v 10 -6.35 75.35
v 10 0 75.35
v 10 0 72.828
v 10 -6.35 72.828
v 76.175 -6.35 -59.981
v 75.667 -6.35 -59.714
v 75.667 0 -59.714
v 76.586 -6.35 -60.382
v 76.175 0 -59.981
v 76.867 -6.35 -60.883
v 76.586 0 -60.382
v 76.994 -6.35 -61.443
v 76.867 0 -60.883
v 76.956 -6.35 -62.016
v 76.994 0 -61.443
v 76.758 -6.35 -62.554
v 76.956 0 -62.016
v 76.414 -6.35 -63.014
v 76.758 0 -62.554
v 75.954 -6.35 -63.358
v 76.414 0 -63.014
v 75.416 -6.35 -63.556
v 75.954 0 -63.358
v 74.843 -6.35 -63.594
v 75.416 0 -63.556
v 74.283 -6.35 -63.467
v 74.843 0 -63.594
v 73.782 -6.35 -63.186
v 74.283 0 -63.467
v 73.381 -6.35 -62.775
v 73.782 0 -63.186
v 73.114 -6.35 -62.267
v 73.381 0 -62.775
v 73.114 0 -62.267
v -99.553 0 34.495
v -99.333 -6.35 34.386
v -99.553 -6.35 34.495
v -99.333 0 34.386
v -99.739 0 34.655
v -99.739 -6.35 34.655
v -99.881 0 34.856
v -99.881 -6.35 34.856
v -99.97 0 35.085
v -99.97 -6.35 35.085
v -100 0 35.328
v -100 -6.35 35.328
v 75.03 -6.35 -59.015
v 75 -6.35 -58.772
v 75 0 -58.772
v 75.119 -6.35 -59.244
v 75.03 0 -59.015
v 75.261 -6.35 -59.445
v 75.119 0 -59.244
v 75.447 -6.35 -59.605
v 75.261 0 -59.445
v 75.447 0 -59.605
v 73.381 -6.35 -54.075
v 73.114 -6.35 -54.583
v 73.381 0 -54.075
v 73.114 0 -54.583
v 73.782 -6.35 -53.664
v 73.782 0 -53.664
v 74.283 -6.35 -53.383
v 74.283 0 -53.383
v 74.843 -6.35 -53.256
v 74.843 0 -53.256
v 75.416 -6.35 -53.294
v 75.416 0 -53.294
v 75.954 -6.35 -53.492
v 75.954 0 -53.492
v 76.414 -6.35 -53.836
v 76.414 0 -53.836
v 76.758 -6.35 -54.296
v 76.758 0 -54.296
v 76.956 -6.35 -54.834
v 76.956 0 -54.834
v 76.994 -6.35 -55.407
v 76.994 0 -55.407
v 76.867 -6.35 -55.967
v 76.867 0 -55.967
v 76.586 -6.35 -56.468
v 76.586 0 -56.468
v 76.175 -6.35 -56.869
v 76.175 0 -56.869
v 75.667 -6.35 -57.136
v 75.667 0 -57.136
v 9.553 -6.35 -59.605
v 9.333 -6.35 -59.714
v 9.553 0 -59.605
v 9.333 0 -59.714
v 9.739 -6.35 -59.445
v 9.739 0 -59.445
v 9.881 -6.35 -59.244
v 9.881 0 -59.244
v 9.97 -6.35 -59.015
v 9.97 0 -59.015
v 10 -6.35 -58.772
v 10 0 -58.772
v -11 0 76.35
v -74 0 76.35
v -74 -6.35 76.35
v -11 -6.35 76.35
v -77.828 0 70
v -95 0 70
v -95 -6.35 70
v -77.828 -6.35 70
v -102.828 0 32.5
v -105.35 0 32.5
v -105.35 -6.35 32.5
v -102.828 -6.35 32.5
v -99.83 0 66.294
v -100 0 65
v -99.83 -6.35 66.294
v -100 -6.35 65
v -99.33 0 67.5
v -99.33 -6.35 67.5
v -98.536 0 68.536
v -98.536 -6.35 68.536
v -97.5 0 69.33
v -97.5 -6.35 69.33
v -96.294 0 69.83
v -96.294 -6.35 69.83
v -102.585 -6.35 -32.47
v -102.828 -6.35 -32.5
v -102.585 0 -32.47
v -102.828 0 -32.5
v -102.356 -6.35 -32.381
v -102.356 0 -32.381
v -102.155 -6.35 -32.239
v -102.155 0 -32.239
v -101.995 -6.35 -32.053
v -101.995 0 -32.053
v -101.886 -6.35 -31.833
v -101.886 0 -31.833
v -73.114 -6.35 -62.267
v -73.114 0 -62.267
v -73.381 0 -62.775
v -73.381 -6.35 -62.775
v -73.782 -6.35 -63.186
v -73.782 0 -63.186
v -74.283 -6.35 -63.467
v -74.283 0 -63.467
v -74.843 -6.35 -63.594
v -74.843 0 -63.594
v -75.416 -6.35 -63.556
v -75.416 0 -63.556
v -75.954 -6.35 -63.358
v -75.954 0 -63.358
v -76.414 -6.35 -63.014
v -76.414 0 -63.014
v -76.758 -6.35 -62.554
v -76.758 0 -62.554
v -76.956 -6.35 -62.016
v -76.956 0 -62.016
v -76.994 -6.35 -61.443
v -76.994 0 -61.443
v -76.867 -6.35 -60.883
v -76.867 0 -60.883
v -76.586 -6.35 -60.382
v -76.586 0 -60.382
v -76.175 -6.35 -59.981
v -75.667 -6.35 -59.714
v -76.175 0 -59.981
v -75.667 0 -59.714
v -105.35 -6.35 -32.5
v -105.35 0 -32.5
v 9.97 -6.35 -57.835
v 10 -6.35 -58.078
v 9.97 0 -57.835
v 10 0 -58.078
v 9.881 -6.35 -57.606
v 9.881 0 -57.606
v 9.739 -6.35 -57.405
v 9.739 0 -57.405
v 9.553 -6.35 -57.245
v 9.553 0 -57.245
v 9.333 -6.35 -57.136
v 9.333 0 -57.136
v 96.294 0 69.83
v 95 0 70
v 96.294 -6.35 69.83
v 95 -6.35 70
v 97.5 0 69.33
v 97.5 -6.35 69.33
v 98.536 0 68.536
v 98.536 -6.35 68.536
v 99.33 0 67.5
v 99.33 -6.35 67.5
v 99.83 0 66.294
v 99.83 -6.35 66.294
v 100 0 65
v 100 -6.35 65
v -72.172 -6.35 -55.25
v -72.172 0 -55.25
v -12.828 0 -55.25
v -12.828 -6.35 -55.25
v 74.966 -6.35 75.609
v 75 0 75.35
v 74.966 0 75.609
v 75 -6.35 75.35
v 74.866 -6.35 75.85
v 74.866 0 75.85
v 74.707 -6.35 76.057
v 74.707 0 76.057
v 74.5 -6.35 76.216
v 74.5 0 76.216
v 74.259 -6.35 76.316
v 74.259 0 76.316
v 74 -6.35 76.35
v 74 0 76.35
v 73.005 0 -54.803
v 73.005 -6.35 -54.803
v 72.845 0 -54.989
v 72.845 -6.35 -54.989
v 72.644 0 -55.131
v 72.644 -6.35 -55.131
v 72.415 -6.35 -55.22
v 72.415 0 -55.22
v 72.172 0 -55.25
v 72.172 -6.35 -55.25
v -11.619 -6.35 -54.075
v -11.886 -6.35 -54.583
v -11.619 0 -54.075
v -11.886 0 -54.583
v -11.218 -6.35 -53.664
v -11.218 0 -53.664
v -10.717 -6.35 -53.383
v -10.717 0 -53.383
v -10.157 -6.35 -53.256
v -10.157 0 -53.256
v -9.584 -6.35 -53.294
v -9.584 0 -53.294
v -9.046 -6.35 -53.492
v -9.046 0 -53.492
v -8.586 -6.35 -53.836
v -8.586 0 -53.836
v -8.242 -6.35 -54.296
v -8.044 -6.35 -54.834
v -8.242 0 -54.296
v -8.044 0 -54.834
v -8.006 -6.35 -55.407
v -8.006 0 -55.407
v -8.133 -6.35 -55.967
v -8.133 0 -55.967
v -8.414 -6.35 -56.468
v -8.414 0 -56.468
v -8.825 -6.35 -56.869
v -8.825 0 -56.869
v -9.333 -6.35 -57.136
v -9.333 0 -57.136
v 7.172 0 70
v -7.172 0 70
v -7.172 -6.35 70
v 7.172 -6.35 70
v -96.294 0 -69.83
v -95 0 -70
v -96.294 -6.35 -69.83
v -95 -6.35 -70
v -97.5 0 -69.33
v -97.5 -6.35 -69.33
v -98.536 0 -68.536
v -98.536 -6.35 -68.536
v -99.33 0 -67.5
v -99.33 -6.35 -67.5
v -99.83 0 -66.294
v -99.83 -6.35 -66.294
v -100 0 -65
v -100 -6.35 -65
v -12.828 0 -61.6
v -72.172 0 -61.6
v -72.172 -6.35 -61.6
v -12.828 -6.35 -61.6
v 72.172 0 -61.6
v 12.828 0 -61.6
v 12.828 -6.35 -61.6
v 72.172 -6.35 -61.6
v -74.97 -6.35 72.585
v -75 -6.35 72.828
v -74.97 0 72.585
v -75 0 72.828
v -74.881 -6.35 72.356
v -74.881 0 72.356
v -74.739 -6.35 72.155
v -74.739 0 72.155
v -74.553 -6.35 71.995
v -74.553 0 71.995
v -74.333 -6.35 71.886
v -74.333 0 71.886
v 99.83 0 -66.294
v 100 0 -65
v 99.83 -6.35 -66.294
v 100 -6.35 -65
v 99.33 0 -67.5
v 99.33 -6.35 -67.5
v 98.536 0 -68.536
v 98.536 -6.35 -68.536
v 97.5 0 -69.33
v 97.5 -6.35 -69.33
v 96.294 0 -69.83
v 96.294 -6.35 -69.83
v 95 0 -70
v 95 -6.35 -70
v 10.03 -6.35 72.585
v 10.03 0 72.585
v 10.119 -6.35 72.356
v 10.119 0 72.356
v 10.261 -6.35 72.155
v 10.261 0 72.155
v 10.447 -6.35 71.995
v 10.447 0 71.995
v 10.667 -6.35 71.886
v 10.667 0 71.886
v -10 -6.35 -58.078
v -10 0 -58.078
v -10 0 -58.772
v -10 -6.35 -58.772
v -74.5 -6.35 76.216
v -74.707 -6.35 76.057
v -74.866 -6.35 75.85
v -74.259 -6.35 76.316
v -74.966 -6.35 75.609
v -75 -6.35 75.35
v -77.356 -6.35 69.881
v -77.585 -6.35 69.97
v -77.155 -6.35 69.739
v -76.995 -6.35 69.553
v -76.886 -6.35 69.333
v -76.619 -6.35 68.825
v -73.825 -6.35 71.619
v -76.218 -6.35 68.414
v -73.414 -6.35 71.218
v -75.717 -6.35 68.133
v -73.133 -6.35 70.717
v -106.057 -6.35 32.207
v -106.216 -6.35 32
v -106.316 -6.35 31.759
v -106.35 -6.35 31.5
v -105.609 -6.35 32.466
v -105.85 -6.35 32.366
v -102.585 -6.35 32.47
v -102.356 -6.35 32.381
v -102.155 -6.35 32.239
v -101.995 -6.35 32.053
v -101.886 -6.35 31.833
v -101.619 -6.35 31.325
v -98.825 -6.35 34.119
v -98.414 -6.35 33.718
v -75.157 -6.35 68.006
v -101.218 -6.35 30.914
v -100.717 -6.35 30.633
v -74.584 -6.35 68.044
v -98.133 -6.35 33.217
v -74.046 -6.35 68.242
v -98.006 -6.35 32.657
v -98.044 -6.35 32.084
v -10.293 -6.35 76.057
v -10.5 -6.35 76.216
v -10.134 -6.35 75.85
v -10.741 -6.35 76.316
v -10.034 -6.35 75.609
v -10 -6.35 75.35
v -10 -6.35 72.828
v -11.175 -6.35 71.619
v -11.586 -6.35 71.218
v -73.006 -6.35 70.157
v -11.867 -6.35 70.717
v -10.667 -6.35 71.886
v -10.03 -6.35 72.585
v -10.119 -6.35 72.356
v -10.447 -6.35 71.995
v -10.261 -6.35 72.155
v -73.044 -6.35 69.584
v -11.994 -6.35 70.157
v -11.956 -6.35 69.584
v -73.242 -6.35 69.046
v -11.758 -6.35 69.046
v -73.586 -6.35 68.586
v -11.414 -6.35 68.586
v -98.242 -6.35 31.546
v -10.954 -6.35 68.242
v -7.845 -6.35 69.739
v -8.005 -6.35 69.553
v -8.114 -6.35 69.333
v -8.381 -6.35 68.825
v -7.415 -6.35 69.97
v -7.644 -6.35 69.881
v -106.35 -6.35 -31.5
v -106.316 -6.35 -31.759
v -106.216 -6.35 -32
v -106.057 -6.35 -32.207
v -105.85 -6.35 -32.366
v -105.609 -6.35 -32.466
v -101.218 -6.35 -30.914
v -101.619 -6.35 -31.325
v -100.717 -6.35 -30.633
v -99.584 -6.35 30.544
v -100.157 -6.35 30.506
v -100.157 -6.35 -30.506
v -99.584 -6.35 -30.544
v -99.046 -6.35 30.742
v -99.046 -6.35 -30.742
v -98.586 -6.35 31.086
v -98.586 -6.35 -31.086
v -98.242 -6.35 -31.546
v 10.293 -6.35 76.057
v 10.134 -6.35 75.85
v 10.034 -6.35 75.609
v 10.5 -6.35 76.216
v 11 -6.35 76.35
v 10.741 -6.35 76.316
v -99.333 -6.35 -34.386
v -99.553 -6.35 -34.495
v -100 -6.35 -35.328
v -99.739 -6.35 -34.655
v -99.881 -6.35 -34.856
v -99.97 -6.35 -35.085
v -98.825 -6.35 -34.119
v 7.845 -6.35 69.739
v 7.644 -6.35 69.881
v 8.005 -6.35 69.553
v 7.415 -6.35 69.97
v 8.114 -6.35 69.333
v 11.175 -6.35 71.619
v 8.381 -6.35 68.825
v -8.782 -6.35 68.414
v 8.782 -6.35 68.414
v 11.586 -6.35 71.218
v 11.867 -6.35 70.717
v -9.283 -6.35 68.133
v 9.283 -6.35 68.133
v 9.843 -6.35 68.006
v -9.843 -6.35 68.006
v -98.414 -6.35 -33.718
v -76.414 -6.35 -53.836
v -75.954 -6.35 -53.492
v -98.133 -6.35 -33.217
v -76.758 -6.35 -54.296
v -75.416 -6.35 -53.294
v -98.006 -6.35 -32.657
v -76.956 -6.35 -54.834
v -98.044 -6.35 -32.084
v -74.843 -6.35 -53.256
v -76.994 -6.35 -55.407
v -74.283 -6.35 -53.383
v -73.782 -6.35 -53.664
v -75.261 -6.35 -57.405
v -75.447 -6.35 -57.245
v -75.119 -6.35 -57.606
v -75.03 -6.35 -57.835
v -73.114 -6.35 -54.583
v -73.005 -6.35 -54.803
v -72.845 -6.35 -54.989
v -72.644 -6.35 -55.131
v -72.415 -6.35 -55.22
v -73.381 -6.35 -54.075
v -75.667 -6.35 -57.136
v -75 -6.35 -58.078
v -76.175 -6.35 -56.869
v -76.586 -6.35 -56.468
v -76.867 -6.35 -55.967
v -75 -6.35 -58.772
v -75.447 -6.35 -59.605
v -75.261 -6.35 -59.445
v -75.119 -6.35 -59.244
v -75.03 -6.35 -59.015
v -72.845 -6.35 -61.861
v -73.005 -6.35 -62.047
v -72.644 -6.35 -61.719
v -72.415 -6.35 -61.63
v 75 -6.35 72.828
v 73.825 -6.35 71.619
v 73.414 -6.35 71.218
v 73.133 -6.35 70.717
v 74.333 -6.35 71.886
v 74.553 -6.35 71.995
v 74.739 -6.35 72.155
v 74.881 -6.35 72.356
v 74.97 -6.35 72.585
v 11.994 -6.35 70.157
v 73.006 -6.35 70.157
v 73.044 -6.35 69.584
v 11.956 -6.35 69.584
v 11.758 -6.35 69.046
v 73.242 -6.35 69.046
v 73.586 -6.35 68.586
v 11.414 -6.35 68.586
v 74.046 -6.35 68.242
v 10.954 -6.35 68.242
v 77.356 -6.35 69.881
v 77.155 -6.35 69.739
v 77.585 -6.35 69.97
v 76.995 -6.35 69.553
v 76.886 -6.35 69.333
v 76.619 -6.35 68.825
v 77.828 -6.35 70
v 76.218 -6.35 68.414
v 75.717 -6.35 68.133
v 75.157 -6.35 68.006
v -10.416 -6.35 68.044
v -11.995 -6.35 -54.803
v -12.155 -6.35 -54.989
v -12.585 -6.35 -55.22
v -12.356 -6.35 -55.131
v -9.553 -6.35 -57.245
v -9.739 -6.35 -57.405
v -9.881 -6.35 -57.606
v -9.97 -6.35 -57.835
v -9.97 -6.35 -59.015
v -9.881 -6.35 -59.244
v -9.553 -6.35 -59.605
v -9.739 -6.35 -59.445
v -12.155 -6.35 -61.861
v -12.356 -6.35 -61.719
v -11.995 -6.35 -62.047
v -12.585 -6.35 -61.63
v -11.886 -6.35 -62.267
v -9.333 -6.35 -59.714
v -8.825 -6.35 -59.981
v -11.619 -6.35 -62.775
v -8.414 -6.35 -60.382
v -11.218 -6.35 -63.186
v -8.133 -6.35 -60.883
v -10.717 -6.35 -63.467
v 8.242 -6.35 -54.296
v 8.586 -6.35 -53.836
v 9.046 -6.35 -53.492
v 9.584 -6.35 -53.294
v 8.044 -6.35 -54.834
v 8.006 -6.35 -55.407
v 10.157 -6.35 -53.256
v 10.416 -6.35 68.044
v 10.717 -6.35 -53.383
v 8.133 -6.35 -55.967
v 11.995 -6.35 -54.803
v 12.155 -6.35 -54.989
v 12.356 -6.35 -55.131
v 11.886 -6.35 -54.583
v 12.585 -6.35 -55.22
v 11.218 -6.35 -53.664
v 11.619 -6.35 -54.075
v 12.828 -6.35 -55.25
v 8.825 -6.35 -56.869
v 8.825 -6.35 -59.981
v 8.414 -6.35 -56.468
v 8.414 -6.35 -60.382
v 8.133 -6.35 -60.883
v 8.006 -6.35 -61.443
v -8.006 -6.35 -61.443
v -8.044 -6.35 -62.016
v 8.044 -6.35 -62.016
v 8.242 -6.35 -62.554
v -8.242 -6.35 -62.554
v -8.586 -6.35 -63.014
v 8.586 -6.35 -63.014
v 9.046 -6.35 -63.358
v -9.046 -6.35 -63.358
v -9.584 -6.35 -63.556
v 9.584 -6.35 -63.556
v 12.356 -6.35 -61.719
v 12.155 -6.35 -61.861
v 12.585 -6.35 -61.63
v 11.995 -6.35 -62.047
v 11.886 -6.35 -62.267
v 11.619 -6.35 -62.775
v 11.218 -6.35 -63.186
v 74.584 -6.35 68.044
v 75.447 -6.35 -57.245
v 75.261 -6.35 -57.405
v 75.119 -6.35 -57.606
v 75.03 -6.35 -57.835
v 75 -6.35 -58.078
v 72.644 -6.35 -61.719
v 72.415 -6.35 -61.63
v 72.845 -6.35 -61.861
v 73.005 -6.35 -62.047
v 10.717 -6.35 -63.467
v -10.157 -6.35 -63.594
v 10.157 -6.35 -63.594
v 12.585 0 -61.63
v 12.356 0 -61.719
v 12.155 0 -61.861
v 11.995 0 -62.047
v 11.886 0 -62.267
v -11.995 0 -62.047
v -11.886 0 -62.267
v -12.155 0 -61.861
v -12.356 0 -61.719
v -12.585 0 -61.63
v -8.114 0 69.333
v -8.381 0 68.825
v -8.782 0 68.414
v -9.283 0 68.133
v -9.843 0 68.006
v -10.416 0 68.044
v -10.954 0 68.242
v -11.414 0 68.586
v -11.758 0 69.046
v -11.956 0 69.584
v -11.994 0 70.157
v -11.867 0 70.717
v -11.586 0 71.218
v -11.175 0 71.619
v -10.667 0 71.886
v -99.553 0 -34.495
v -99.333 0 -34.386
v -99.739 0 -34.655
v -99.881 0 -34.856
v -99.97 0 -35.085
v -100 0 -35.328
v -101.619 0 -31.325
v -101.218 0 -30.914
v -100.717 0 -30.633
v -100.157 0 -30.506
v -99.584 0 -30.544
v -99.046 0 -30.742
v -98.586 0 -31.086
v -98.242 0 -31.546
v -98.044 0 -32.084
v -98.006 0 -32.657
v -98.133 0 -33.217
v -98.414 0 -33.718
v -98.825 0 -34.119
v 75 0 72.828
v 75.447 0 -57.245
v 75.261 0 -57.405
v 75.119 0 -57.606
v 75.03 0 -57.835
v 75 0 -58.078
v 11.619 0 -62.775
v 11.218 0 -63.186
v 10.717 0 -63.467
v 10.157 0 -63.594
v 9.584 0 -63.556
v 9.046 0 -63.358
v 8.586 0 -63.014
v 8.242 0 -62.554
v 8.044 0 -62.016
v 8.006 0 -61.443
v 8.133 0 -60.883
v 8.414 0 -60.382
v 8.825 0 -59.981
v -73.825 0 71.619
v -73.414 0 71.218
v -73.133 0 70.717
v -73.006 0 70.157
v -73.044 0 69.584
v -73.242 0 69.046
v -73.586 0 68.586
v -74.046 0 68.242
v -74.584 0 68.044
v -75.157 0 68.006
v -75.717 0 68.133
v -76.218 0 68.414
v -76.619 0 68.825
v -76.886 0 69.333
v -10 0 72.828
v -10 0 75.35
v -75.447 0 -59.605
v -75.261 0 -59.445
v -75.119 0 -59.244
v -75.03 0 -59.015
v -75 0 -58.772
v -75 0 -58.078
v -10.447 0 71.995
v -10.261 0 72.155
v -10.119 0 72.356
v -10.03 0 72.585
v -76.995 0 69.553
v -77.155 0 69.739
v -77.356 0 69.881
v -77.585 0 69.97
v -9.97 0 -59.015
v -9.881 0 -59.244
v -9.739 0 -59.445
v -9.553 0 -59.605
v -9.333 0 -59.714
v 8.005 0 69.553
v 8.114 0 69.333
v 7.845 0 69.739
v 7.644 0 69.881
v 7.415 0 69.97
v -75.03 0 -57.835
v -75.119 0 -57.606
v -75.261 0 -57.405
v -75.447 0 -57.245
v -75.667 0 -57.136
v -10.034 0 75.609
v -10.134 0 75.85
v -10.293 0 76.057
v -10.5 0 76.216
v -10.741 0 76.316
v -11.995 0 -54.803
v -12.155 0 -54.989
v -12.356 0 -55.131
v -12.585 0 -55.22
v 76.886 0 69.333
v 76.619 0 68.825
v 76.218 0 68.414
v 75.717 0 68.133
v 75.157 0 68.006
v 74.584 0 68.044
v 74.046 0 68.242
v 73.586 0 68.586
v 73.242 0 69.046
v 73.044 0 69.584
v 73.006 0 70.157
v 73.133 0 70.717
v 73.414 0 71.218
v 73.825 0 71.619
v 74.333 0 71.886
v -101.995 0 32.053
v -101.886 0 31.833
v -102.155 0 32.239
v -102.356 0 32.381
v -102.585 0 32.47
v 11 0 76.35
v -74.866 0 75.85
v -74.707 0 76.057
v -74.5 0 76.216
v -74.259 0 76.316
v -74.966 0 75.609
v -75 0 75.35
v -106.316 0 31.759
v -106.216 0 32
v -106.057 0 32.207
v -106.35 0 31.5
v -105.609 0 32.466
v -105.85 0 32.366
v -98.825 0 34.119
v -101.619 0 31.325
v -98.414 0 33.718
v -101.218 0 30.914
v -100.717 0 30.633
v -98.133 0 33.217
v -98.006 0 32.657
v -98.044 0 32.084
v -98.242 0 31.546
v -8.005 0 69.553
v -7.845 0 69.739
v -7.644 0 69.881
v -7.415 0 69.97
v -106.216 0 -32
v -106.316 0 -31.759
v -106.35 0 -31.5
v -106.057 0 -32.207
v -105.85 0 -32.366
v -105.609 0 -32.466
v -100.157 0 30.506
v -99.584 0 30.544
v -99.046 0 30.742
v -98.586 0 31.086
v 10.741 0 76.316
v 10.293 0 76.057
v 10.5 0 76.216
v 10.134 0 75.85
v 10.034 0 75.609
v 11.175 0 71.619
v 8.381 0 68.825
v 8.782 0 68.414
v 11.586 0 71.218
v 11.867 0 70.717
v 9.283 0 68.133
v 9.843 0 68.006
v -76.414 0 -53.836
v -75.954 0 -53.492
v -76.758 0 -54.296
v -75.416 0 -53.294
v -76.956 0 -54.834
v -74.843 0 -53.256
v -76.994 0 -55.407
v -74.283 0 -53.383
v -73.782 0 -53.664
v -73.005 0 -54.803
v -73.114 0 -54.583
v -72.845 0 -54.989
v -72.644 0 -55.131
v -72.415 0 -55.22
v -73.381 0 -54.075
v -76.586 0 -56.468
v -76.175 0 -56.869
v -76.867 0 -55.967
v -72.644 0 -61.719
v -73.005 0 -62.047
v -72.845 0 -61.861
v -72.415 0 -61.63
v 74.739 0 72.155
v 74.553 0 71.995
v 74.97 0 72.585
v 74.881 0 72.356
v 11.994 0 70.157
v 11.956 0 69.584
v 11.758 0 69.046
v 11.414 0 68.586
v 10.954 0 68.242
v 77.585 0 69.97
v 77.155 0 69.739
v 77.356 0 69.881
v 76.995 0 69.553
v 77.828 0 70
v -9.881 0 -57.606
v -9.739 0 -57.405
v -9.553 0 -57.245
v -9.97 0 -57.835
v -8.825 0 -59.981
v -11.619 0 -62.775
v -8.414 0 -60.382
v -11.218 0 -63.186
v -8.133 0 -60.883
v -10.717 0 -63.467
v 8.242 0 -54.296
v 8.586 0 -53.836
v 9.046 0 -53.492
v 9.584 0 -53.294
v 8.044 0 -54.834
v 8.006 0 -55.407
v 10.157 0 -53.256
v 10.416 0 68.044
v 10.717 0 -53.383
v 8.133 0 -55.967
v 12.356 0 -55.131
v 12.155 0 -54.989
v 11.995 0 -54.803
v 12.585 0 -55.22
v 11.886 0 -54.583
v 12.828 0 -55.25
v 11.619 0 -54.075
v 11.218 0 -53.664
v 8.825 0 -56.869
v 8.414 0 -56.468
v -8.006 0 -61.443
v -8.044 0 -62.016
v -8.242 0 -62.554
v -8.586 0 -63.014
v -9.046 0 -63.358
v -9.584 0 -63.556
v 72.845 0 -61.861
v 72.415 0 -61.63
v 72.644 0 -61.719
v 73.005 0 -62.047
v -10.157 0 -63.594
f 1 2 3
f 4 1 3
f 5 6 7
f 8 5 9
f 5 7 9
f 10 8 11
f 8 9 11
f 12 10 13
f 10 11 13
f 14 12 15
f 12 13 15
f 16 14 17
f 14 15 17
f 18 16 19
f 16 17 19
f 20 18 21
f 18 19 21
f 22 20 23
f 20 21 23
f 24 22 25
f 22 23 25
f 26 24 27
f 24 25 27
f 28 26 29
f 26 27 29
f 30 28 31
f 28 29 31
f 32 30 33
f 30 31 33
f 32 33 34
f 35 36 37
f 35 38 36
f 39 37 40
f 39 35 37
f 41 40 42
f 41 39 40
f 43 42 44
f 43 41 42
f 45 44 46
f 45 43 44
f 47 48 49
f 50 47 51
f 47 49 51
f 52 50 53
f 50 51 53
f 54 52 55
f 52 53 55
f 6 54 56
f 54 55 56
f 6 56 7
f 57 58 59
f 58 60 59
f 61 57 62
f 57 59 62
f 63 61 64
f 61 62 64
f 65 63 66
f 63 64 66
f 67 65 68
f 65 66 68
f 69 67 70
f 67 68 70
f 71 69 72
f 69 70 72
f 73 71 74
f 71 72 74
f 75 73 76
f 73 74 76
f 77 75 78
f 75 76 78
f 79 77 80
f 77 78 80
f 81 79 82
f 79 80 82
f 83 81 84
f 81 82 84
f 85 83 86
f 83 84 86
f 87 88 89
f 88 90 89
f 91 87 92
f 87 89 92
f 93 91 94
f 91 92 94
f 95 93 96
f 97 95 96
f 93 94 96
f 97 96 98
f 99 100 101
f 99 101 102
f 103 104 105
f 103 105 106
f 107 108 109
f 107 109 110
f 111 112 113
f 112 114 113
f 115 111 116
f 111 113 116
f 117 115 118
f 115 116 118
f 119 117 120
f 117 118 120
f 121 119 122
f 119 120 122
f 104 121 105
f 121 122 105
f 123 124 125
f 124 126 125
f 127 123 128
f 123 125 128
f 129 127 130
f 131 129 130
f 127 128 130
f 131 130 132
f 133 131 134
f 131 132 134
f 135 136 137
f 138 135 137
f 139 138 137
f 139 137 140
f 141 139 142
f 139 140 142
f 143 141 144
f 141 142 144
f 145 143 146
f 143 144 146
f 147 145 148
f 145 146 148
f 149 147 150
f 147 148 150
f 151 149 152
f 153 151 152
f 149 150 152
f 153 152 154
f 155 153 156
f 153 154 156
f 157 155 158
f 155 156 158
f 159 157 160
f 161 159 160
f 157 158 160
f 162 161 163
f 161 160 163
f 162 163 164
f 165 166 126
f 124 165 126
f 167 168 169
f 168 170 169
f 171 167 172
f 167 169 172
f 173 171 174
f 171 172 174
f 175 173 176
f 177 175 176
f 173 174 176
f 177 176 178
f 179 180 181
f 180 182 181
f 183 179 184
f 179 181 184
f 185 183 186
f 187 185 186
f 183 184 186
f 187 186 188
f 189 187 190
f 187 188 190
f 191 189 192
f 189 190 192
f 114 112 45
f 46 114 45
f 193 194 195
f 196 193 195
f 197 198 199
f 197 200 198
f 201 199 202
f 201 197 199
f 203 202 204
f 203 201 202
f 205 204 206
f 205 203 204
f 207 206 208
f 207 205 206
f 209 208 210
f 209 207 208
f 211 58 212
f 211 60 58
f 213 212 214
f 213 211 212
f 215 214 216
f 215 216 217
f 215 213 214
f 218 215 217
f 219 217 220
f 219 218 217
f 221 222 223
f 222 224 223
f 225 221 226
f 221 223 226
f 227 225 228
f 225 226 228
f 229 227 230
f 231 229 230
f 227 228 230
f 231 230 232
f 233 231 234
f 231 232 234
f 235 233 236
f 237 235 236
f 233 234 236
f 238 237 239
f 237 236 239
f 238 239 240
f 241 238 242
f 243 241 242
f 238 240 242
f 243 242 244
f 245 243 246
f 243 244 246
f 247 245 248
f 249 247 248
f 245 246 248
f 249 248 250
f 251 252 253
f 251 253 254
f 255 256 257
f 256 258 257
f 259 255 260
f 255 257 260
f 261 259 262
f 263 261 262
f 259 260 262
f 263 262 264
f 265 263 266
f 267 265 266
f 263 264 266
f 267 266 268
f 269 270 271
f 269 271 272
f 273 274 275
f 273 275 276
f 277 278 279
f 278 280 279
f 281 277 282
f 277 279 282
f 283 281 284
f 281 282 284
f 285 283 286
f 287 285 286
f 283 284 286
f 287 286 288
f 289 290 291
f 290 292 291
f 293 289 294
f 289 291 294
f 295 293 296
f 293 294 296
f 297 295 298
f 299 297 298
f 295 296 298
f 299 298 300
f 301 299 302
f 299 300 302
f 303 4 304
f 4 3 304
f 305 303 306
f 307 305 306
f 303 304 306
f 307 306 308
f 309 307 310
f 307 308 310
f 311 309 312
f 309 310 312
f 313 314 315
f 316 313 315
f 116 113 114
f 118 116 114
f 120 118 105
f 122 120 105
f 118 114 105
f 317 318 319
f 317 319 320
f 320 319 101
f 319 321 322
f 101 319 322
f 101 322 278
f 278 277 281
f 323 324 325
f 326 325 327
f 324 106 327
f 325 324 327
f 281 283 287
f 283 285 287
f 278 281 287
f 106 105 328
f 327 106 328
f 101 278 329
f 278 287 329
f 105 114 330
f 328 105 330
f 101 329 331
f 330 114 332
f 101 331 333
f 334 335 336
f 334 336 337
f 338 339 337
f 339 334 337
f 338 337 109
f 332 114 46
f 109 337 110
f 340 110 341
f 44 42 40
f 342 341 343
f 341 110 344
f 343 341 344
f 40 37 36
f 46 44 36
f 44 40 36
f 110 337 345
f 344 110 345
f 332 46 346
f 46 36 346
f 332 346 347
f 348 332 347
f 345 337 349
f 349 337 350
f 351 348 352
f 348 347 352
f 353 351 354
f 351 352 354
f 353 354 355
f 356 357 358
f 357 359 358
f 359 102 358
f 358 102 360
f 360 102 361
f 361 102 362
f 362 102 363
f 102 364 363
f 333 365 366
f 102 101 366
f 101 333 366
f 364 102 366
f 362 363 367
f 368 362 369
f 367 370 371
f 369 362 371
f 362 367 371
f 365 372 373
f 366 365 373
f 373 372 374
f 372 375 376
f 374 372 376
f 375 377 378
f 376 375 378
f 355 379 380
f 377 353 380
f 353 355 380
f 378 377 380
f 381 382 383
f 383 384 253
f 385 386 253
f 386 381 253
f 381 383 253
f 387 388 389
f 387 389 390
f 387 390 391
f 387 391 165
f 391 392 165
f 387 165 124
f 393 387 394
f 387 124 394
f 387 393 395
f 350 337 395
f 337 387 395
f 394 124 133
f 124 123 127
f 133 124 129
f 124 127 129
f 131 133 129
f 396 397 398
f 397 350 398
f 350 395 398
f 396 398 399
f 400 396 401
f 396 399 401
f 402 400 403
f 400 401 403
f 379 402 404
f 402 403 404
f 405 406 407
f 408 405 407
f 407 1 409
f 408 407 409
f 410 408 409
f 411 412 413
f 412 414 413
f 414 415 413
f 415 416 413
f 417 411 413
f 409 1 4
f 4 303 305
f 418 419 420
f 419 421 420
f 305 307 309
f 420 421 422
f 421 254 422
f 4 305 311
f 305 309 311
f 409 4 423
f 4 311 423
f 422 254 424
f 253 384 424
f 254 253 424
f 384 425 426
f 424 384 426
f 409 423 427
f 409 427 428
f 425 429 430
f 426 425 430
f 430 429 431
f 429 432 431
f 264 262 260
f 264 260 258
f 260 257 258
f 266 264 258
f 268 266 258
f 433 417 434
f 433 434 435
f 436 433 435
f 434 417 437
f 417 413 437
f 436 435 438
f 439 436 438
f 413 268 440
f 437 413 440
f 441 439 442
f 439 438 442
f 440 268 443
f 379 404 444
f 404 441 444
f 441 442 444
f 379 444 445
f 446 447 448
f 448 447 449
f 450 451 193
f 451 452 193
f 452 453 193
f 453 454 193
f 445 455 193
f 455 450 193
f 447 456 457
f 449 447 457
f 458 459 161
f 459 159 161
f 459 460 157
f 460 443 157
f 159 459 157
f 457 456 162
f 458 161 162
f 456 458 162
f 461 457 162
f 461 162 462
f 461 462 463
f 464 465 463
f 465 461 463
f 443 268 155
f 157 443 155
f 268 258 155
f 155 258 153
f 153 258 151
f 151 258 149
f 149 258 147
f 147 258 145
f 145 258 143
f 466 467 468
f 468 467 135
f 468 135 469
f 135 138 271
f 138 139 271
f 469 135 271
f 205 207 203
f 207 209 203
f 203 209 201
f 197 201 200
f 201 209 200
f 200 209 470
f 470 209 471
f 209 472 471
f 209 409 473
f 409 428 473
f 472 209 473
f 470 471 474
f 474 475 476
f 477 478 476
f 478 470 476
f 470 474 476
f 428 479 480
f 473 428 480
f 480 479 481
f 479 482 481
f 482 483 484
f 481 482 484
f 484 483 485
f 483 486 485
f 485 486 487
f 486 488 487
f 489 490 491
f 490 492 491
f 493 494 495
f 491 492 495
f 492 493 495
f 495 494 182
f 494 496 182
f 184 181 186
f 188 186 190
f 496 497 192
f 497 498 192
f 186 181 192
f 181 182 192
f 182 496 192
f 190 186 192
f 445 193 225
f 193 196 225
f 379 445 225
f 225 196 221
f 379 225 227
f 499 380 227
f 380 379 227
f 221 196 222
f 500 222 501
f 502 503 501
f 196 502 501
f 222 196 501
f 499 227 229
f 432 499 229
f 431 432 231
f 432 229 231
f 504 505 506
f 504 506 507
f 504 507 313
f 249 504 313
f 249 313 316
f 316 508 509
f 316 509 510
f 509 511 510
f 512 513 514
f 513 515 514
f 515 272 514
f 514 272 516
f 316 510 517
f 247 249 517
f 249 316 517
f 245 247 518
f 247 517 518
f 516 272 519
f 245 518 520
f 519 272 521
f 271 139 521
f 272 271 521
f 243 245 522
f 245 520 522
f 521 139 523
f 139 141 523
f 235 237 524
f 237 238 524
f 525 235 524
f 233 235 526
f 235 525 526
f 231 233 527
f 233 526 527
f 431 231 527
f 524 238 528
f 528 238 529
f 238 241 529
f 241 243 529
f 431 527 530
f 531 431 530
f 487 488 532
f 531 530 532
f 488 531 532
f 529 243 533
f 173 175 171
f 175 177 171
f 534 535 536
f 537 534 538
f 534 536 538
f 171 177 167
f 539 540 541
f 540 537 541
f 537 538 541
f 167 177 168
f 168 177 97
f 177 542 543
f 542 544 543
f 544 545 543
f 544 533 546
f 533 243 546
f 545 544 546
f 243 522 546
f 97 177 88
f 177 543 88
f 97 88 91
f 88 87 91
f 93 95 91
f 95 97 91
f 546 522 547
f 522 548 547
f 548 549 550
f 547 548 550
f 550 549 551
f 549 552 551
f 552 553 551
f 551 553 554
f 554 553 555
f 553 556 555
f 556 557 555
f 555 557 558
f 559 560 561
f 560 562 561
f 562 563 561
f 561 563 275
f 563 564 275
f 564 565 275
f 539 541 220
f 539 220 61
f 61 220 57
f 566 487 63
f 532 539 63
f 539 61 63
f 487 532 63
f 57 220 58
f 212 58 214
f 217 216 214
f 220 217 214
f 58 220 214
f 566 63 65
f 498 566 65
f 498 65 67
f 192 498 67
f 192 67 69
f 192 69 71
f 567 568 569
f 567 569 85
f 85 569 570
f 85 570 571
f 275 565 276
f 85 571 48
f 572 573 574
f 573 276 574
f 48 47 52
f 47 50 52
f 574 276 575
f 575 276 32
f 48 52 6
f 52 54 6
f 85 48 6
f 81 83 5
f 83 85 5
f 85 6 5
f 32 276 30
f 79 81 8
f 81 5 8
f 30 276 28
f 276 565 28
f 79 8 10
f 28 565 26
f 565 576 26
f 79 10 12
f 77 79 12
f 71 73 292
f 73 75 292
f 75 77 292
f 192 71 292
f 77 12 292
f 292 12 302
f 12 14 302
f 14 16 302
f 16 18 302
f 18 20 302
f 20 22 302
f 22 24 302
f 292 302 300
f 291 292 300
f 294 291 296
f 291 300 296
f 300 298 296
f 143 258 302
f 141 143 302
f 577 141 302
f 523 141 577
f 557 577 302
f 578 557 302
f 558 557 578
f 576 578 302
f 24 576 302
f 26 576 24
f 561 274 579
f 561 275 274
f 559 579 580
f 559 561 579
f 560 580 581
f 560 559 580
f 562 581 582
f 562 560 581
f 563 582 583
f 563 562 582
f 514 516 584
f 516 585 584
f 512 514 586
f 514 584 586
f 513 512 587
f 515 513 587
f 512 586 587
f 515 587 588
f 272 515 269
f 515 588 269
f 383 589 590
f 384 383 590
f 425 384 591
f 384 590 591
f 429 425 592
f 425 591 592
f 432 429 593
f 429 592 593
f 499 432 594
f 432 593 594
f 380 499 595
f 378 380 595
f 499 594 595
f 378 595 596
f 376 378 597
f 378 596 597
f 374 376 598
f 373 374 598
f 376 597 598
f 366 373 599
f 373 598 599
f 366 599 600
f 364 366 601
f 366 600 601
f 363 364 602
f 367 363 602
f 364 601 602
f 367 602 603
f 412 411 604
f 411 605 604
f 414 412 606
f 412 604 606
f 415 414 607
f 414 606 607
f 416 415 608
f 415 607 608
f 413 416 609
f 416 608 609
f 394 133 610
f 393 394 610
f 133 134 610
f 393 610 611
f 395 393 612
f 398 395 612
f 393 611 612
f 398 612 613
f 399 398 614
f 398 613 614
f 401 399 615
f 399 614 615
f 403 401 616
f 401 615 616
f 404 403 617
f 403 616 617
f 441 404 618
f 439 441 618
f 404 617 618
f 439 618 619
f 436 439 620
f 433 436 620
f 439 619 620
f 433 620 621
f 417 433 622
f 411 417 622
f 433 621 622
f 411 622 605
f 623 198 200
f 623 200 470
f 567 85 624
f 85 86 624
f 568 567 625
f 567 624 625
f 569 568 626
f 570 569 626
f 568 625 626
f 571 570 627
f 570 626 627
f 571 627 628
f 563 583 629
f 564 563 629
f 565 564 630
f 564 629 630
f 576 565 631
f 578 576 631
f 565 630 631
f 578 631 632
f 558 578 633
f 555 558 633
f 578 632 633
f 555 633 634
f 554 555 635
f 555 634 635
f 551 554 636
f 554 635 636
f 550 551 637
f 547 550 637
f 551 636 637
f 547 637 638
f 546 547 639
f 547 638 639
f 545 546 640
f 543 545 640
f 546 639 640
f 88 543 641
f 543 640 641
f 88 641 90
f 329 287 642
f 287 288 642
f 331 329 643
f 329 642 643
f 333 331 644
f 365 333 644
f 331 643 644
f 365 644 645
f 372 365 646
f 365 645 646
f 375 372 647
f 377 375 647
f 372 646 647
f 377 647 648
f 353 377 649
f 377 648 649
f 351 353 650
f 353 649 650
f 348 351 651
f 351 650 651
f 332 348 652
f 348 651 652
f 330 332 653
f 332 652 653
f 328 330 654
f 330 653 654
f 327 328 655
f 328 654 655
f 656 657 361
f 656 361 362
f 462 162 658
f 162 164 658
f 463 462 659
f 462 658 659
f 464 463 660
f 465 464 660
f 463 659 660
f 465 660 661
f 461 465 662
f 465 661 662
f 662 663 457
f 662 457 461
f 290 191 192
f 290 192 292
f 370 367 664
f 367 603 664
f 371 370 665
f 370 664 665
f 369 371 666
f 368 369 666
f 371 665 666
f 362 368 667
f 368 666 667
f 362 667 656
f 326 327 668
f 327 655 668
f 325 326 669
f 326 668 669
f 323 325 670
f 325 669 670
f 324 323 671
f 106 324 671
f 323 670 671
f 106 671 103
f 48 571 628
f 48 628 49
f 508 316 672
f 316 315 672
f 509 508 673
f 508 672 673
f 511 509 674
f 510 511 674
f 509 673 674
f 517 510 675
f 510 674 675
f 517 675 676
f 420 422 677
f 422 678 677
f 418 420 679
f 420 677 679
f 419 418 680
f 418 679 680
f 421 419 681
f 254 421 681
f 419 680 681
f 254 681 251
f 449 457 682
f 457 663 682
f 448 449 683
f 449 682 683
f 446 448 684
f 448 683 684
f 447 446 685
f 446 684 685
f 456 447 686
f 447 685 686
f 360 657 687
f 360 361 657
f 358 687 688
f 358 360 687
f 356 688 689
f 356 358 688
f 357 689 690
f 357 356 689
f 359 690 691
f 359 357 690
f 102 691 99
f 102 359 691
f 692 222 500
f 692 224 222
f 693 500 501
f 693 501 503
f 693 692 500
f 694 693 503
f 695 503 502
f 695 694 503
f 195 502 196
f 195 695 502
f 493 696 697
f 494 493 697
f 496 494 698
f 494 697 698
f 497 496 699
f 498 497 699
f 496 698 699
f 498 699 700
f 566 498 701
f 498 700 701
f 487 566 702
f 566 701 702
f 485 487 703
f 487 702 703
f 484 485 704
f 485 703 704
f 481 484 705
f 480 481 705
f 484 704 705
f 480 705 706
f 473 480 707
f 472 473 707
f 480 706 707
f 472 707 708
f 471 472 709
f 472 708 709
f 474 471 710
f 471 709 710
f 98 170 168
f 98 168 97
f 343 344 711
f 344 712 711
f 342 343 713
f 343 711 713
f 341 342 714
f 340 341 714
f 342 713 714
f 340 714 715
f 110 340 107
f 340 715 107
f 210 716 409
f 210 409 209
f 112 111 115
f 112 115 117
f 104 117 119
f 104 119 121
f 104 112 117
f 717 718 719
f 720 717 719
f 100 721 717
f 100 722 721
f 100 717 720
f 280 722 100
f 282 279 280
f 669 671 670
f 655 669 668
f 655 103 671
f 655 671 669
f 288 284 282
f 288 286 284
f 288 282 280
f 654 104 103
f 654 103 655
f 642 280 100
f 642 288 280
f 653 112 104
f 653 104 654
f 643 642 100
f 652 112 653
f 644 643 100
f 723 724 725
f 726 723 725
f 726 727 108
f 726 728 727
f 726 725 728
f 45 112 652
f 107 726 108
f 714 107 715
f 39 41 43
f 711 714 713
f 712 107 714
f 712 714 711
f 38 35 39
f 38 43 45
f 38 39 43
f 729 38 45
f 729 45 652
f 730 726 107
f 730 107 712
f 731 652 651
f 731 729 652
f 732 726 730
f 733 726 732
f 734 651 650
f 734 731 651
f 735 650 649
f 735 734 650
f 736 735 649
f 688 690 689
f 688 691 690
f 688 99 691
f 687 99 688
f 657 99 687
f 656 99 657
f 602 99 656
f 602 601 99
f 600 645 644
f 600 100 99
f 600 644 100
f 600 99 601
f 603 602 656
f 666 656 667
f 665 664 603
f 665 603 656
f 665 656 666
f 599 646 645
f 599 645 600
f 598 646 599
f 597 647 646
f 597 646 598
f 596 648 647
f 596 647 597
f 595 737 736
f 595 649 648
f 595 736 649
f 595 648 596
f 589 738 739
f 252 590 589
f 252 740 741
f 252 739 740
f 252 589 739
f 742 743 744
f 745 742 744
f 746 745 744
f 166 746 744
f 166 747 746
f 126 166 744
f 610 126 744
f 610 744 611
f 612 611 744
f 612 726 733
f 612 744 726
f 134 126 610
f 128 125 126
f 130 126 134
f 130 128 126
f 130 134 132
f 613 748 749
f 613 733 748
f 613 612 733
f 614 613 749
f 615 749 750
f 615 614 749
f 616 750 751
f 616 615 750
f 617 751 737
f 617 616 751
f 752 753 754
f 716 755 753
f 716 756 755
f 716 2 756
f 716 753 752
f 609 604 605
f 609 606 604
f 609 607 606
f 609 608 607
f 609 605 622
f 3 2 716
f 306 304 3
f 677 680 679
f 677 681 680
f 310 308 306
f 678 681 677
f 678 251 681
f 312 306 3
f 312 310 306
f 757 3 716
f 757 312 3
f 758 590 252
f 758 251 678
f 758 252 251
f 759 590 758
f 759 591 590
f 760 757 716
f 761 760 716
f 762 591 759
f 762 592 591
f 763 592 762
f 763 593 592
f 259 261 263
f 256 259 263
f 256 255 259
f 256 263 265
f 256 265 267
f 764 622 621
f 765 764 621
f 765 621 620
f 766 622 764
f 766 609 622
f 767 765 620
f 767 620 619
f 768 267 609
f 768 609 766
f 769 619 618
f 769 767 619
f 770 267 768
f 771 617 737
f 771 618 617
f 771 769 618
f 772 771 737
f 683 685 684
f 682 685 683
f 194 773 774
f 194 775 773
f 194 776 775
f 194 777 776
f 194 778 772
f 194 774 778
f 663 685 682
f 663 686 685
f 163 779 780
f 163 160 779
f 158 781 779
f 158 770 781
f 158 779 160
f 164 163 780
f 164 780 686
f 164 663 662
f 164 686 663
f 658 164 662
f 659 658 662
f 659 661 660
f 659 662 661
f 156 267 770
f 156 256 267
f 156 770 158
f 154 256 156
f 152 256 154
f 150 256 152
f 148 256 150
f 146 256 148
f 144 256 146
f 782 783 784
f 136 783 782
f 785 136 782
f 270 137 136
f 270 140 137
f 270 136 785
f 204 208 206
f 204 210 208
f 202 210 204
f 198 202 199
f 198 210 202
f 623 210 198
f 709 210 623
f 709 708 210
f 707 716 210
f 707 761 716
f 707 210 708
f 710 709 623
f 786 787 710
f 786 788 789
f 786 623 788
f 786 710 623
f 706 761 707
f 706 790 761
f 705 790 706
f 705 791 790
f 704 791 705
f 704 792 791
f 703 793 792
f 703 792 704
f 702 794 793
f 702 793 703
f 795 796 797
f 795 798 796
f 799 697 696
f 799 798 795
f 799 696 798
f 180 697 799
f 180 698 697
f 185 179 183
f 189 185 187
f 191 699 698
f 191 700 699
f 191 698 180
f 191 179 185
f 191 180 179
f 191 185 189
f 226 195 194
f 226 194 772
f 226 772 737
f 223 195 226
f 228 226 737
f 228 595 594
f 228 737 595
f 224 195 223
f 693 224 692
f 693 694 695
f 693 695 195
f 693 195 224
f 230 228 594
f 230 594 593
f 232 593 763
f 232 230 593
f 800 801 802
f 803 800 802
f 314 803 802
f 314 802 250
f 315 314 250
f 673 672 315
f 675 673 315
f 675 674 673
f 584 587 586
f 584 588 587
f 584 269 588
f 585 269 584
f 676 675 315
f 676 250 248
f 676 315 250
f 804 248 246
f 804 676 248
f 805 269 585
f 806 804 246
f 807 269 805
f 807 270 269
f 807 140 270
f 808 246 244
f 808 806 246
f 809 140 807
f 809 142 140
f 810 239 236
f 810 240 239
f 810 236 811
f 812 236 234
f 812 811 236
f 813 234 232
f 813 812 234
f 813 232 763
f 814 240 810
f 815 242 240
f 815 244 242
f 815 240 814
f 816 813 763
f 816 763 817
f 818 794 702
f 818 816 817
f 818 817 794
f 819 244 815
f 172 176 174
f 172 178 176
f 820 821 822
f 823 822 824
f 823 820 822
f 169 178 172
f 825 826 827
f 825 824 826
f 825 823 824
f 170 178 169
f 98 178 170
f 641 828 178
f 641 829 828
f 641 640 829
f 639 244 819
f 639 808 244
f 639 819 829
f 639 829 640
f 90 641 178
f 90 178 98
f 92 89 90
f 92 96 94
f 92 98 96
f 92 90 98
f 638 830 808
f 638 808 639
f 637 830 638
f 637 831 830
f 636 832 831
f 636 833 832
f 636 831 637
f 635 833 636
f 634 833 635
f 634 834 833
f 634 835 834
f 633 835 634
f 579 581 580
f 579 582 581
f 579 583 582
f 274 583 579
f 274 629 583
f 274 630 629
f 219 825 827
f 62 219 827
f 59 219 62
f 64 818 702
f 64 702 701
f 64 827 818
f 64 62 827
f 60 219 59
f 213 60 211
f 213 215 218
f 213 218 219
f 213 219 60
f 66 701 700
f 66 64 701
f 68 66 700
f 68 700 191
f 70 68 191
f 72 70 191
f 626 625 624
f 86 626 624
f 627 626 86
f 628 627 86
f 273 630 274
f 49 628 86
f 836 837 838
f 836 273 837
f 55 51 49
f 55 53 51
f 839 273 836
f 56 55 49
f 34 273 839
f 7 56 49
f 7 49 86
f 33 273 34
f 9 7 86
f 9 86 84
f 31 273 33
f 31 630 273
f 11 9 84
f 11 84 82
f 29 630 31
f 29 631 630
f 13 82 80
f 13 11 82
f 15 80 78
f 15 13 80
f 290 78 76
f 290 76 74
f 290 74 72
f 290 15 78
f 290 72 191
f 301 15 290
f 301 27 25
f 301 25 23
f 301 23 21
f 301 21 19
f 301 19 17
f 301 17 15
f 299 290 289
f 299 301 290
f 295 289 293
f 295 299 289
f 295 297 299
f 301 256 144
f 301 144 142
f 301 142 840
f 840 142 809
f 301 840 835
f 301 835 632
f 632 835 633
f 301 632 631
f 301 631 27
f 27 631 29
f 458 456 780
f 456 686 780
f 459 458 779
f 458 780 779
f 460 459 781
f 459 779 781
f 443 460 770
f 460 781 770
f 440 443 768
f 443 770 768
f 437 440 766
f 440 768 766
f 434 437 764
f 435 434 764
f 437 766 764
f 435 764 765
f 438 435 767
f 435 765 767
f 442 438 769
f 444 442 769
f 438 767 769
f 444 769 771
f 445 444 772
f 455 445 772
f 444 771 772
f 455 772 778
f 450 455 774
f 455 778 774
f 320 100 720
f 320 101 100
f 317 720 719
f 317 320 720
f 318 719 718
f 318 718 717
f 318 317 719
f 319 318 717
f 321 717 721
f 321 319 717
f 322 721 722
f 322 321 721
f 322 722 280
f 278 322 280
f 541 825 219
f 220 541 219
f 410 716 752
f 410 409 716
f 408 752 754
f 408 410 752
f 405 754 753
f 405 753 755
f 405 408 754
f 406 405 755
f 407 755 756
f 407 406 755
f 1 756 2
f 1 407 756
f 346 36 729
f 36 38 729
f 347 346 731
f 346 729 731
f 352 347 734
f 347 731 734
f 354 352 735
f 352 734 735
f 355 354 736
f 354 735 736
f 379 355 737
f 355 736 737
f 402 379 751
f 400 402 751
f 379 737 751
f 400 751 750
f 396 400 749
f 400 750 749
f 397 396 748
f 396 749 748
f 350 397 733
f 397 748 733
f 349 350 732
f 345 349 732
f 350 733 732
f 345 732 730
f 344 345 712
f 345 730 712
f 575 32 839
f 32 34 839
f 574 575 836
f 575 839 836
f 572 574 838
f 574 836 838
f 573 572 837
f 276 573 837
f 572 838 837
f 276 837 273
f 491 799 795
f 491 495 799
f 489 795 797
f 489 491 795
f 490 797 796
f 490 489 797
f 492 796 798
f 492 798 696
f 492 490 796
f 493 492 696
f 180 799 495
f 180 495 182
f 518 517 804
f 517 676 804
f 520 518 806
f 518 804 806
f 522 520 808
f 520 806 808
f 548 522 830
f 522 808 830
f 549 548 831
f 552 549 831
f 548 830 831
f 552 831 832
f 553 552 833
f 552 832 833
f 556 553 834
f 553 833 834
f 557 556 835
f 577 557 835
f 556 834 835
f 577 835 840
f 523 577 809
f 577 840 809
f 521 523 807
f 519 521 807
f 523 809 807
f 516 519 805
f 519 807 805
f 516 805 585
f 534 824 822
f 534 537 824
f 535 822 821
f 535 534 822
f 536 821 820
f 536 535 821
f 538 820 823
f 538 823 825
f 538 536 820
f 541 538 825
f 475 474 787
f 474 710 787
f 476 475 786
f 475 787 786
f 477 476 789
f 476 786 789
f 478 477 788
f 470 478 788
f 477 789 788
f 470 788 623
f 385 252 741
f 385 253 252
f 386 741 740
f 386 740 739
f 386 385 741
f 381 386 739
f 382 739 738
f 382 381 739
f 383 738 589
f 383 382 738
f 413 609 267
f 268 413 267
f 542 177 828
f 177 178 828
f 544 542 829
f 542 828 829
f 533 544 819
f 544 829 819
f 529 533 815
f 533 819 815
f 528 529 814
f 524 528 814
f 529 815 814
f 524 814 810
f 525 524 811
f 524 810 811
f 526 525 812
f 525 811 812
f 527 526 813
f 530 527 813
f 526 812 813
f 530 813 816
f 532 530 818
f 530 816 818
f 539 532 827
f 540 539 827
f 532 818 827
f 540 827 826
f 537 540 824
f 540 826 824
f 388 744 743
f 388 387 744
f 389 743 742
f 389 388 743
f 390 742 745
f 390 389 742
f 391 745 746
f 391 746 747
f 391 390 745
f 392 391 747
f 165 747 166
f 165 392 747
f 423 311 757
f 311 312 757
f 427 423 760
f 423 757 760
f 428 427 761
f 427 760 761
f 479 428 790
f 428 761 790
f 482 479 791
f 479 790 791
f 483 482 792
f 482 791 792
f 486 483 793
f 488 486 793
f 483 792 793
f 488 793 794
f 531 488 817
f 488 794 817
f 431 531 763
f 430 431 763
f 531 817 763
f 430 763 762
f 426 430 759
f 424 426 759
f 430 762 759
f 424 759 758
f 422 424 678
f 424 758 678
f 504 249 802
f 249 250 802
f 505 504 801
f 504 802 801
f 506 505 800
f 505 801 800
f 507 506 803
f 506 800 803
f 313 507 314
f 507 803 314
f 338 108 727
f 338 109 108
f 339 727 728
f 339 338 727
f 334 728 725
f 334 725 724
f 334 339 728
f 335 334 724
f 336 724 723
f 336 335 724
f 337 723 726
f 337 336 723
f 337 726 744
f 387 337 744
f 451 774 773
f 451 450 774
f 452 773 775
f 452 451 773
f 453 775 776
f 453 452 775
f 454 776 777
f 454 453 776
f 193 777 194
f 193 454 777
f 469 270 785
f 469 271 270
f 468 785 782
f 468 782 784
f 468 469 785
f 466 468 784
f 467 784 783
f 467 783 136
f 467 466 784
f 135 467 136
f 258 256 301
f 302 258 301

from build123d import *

# Parameters (mm, degrees)
SKETCH1_W              = 200
SKETCH1_H              = 140
BOSS_EXTRUDE1_DEPTH    = 6.35
SKETCH4_W              = 65
SKETCH4_H              = 6.35
BOSS_EXTRUDE2_DEPTH    = 6.35
LPATTERN1_COUNT        = 2
LPATTERN1_PITCH        = 85
SKETCH5_W              = 6.35
SKETCH5_H              = 65
BOSS_EXTRUDE3_DEPTH    = 6.35
SKETCH6_W              = 65
SKETCH6_H              = 6.35
CUT_EXTRUDE3_DEPTH     = 6.35
SKETCH7_R              = 2
CUT_EXTRUDE4_DEPTH     = 6.35
FILLET4_R              = 1
LPATTERN2_COUNT        = 2
LPATTERN2_PITCH        = 85
FILLET4_OF_LPATTERN2_R = 1
FILLET5_R              = 5
SKETCH8_R              = 2
CUT_EXTRUDE6_DEPTH     = 6.35
FILLET6_R              = 1


with BuildPart() as part:
    # Sketch1 → Boss-Extrude1 (new body)
    with BuildSketch(Plane(origin=(0, 0, 0), x_dir=(1, 0, 0), z_dir=(0, 1, 0))):
        Rectangle(SKETCH1_W, SKETCH1_H)
    extrude(amount=-BOSS_EXTRUDE1_DEPTH)

    # Sketch4 → Boss-Extrude2 (add)
    with BuildSketch(Plane(origin=(0, 0, 0), x_dir=(1, 0, 0), z_dir=(0, 1, 0))):
        with Locations((-42.5, -73.175)):
            Rectangle(SKETCH4_W, SKETCH4_H)
    boss_extrude2 = extrude(amount=-BOSS_EXTRUDE2_DEPTH)

    # LPattern1: Boss-Extrude2 ×2
    with Locations(*[(i * LPATTERN1_PITCH, 0, 0) for i in range(1, LPATTERN1_COUNT)]):
        add(boss_extrude2)

    # Sketch5 → Boss-Extrude3 (add)
    with BuildSketch(Plane(origin=(0, 0, 0), x_dir=(1, 0, 0), z_dir=(0, 1, 0))):
        with Locations((-103.175, 0)):
            Rectangle(SKETCH5_W, SKETCH5_H)
    extrude(amount=-BOSS_EXTRUDE3_DEPTH)

    # Sketch6 → Cut-Extrude3 (cut)
    with BuildSketch(Plane(origin=(0, 0, 0), x_dir=(1, 0, 0), z_dir=(0, 1, 0))):
        with Locations((42.5, 58.425)):
            Rectangle(SKETCH6_W, SKETCH6_H)
    cut_extrude3 = extrude(amount=-CUT_EXTRUDE3_DEPTH, mode=Mode.SUBTRACT)

    # Sketch7 → Cut-Extrude4 (cut)
    with BuildSketch(Plane(origin=(0, 0, 0), x_dir=(1, 0, 0), z_dir=(0, 1, 0))):
        with Locations((10, 55.25)):
            Circle(SKETCH7_R)
        with Locations((75, 55.25)):
            Circle(SKETCH7_R)
        with Locations((10, 61.6)):
            Circle(SKETCH7_R)
        with Locations((75, 61.6)):
            Circle(SKETCH7_R)
    cut_extrude4 = extrude(amount=-CUT_EXTRUDE4_DEPTH, mode=Mode.SUBTRACT)

    # Fillet4
    fillet4_edges = [part.edges().sort_by_distance(p)[0] for p in [
        (73, -3.175, -55.25),
        (12, -3.175, -55.25),
        (75, -3.175, -59.6),
        (12, -3.175, -61.6),
        (10, -3.175, -57.25),
        (73, -3.175, -61.6),
        (75, -3.175, -57.25),
        (10, -3.175, -59.6),
    ]]
    fillet(fillet4_edges, radius=FILLET4_R)

    # LPattern2: Cut-Extrude3, Cut-Extrude4 ×2
    with Locations(*[(-i * LPATTERN2_PITCH, 0, 0) for i in range(1, LPATTERN2_COUNT)]):
        add(cut_extrude3, mode=Mode.SUBTRACT)
        add(cut_extrude4, mode=Mode.SUBTRACT)

    # Fillet4 of LPattern2
    fillet4_of_lpattern2_edges = [part.edges().sort_by_distance(p)[0] for p in [
        (-12, -3.175, -55.25),
        (-73, -3.175, -55.25),
        (-10, -3.175, -59.6),
        (-73, -3.175, -61.6),
        (-75, -3.175, -57.25),
        (-12, -3.175, -61.6),
        (-10, -3.175, -57.25),
        (-75, -3.175, -59.6),
    ]]
    fillet(fillet4_of_lpattern2_edges, radius=FILLET4_OF_LPATTERN2_R)

    # Fillet5
    fillet5_edges = [part.edges().sort_by_distance(p)[0] for p in [
        (100, -3.175, 70),
        (-100, -3.175, 70),
        (-100, -3.175, -70),
        (100, -3.175, -70),
    ]]
    fillet(fillet5_edges, radius=FILLET5_R)

    # Sketch8 → Cut-Extrude6 (cut)
    with BuildSketch(Plane(origin=(0, 0, 0), x_dir=(1, 0, 0), z_dir=(0, 1, 0))):
        with Locations((-75, -70)):
            Circle(SKETCH8_R)
        with Locations((-10, -70)):
            Circle(SKETCH8_R)
        with Locations((10, -70)):
            Circle(SKETCH8_R)
        with Locations((75, -70)):
            Circle(SKETCH8_R)
        with Locations((-100, 32.5)):
            Circle(SKETCH8_R)
        with Locations((-100, -32.5)):
            Circle(SKETCH8_R)
    extrude(amount=-CUT_EXTRUDE6_DEPTH, mode=Mode.SUBTRACT)

    # Fillet6
    fillet6_edges = [part.edges().sort_by_distance(p)[0] for p in [
        (-75, -3.175, 76.35),
        (-10, -3.175, 76.35),
        (10, -3.175, 76.35),
        (75, -3.175, 76.35),
        (-102, -3.175, -32.5),
        (-102, -3.175, 32.5),
        (75, -3.175, 72),
        (10, -3.175, 72),
        (-10, -3.175, 72),
        (-75, -3.175, 72),
        (-100, -3.175, -34.5),
        (77, -3.175, 70),
        (8, -3.175, 70),
        (-8, -3.175, 70),
        (-100, -3.175, 34.5),
        (-77, -3.175, 70),
        (-106.35, -3.175, 32.5),
        (-106.35, -3.175, -32.5),
    ]]
    fillet(fillet6_edges, radius=FILLET6_R)


solid = part.part
